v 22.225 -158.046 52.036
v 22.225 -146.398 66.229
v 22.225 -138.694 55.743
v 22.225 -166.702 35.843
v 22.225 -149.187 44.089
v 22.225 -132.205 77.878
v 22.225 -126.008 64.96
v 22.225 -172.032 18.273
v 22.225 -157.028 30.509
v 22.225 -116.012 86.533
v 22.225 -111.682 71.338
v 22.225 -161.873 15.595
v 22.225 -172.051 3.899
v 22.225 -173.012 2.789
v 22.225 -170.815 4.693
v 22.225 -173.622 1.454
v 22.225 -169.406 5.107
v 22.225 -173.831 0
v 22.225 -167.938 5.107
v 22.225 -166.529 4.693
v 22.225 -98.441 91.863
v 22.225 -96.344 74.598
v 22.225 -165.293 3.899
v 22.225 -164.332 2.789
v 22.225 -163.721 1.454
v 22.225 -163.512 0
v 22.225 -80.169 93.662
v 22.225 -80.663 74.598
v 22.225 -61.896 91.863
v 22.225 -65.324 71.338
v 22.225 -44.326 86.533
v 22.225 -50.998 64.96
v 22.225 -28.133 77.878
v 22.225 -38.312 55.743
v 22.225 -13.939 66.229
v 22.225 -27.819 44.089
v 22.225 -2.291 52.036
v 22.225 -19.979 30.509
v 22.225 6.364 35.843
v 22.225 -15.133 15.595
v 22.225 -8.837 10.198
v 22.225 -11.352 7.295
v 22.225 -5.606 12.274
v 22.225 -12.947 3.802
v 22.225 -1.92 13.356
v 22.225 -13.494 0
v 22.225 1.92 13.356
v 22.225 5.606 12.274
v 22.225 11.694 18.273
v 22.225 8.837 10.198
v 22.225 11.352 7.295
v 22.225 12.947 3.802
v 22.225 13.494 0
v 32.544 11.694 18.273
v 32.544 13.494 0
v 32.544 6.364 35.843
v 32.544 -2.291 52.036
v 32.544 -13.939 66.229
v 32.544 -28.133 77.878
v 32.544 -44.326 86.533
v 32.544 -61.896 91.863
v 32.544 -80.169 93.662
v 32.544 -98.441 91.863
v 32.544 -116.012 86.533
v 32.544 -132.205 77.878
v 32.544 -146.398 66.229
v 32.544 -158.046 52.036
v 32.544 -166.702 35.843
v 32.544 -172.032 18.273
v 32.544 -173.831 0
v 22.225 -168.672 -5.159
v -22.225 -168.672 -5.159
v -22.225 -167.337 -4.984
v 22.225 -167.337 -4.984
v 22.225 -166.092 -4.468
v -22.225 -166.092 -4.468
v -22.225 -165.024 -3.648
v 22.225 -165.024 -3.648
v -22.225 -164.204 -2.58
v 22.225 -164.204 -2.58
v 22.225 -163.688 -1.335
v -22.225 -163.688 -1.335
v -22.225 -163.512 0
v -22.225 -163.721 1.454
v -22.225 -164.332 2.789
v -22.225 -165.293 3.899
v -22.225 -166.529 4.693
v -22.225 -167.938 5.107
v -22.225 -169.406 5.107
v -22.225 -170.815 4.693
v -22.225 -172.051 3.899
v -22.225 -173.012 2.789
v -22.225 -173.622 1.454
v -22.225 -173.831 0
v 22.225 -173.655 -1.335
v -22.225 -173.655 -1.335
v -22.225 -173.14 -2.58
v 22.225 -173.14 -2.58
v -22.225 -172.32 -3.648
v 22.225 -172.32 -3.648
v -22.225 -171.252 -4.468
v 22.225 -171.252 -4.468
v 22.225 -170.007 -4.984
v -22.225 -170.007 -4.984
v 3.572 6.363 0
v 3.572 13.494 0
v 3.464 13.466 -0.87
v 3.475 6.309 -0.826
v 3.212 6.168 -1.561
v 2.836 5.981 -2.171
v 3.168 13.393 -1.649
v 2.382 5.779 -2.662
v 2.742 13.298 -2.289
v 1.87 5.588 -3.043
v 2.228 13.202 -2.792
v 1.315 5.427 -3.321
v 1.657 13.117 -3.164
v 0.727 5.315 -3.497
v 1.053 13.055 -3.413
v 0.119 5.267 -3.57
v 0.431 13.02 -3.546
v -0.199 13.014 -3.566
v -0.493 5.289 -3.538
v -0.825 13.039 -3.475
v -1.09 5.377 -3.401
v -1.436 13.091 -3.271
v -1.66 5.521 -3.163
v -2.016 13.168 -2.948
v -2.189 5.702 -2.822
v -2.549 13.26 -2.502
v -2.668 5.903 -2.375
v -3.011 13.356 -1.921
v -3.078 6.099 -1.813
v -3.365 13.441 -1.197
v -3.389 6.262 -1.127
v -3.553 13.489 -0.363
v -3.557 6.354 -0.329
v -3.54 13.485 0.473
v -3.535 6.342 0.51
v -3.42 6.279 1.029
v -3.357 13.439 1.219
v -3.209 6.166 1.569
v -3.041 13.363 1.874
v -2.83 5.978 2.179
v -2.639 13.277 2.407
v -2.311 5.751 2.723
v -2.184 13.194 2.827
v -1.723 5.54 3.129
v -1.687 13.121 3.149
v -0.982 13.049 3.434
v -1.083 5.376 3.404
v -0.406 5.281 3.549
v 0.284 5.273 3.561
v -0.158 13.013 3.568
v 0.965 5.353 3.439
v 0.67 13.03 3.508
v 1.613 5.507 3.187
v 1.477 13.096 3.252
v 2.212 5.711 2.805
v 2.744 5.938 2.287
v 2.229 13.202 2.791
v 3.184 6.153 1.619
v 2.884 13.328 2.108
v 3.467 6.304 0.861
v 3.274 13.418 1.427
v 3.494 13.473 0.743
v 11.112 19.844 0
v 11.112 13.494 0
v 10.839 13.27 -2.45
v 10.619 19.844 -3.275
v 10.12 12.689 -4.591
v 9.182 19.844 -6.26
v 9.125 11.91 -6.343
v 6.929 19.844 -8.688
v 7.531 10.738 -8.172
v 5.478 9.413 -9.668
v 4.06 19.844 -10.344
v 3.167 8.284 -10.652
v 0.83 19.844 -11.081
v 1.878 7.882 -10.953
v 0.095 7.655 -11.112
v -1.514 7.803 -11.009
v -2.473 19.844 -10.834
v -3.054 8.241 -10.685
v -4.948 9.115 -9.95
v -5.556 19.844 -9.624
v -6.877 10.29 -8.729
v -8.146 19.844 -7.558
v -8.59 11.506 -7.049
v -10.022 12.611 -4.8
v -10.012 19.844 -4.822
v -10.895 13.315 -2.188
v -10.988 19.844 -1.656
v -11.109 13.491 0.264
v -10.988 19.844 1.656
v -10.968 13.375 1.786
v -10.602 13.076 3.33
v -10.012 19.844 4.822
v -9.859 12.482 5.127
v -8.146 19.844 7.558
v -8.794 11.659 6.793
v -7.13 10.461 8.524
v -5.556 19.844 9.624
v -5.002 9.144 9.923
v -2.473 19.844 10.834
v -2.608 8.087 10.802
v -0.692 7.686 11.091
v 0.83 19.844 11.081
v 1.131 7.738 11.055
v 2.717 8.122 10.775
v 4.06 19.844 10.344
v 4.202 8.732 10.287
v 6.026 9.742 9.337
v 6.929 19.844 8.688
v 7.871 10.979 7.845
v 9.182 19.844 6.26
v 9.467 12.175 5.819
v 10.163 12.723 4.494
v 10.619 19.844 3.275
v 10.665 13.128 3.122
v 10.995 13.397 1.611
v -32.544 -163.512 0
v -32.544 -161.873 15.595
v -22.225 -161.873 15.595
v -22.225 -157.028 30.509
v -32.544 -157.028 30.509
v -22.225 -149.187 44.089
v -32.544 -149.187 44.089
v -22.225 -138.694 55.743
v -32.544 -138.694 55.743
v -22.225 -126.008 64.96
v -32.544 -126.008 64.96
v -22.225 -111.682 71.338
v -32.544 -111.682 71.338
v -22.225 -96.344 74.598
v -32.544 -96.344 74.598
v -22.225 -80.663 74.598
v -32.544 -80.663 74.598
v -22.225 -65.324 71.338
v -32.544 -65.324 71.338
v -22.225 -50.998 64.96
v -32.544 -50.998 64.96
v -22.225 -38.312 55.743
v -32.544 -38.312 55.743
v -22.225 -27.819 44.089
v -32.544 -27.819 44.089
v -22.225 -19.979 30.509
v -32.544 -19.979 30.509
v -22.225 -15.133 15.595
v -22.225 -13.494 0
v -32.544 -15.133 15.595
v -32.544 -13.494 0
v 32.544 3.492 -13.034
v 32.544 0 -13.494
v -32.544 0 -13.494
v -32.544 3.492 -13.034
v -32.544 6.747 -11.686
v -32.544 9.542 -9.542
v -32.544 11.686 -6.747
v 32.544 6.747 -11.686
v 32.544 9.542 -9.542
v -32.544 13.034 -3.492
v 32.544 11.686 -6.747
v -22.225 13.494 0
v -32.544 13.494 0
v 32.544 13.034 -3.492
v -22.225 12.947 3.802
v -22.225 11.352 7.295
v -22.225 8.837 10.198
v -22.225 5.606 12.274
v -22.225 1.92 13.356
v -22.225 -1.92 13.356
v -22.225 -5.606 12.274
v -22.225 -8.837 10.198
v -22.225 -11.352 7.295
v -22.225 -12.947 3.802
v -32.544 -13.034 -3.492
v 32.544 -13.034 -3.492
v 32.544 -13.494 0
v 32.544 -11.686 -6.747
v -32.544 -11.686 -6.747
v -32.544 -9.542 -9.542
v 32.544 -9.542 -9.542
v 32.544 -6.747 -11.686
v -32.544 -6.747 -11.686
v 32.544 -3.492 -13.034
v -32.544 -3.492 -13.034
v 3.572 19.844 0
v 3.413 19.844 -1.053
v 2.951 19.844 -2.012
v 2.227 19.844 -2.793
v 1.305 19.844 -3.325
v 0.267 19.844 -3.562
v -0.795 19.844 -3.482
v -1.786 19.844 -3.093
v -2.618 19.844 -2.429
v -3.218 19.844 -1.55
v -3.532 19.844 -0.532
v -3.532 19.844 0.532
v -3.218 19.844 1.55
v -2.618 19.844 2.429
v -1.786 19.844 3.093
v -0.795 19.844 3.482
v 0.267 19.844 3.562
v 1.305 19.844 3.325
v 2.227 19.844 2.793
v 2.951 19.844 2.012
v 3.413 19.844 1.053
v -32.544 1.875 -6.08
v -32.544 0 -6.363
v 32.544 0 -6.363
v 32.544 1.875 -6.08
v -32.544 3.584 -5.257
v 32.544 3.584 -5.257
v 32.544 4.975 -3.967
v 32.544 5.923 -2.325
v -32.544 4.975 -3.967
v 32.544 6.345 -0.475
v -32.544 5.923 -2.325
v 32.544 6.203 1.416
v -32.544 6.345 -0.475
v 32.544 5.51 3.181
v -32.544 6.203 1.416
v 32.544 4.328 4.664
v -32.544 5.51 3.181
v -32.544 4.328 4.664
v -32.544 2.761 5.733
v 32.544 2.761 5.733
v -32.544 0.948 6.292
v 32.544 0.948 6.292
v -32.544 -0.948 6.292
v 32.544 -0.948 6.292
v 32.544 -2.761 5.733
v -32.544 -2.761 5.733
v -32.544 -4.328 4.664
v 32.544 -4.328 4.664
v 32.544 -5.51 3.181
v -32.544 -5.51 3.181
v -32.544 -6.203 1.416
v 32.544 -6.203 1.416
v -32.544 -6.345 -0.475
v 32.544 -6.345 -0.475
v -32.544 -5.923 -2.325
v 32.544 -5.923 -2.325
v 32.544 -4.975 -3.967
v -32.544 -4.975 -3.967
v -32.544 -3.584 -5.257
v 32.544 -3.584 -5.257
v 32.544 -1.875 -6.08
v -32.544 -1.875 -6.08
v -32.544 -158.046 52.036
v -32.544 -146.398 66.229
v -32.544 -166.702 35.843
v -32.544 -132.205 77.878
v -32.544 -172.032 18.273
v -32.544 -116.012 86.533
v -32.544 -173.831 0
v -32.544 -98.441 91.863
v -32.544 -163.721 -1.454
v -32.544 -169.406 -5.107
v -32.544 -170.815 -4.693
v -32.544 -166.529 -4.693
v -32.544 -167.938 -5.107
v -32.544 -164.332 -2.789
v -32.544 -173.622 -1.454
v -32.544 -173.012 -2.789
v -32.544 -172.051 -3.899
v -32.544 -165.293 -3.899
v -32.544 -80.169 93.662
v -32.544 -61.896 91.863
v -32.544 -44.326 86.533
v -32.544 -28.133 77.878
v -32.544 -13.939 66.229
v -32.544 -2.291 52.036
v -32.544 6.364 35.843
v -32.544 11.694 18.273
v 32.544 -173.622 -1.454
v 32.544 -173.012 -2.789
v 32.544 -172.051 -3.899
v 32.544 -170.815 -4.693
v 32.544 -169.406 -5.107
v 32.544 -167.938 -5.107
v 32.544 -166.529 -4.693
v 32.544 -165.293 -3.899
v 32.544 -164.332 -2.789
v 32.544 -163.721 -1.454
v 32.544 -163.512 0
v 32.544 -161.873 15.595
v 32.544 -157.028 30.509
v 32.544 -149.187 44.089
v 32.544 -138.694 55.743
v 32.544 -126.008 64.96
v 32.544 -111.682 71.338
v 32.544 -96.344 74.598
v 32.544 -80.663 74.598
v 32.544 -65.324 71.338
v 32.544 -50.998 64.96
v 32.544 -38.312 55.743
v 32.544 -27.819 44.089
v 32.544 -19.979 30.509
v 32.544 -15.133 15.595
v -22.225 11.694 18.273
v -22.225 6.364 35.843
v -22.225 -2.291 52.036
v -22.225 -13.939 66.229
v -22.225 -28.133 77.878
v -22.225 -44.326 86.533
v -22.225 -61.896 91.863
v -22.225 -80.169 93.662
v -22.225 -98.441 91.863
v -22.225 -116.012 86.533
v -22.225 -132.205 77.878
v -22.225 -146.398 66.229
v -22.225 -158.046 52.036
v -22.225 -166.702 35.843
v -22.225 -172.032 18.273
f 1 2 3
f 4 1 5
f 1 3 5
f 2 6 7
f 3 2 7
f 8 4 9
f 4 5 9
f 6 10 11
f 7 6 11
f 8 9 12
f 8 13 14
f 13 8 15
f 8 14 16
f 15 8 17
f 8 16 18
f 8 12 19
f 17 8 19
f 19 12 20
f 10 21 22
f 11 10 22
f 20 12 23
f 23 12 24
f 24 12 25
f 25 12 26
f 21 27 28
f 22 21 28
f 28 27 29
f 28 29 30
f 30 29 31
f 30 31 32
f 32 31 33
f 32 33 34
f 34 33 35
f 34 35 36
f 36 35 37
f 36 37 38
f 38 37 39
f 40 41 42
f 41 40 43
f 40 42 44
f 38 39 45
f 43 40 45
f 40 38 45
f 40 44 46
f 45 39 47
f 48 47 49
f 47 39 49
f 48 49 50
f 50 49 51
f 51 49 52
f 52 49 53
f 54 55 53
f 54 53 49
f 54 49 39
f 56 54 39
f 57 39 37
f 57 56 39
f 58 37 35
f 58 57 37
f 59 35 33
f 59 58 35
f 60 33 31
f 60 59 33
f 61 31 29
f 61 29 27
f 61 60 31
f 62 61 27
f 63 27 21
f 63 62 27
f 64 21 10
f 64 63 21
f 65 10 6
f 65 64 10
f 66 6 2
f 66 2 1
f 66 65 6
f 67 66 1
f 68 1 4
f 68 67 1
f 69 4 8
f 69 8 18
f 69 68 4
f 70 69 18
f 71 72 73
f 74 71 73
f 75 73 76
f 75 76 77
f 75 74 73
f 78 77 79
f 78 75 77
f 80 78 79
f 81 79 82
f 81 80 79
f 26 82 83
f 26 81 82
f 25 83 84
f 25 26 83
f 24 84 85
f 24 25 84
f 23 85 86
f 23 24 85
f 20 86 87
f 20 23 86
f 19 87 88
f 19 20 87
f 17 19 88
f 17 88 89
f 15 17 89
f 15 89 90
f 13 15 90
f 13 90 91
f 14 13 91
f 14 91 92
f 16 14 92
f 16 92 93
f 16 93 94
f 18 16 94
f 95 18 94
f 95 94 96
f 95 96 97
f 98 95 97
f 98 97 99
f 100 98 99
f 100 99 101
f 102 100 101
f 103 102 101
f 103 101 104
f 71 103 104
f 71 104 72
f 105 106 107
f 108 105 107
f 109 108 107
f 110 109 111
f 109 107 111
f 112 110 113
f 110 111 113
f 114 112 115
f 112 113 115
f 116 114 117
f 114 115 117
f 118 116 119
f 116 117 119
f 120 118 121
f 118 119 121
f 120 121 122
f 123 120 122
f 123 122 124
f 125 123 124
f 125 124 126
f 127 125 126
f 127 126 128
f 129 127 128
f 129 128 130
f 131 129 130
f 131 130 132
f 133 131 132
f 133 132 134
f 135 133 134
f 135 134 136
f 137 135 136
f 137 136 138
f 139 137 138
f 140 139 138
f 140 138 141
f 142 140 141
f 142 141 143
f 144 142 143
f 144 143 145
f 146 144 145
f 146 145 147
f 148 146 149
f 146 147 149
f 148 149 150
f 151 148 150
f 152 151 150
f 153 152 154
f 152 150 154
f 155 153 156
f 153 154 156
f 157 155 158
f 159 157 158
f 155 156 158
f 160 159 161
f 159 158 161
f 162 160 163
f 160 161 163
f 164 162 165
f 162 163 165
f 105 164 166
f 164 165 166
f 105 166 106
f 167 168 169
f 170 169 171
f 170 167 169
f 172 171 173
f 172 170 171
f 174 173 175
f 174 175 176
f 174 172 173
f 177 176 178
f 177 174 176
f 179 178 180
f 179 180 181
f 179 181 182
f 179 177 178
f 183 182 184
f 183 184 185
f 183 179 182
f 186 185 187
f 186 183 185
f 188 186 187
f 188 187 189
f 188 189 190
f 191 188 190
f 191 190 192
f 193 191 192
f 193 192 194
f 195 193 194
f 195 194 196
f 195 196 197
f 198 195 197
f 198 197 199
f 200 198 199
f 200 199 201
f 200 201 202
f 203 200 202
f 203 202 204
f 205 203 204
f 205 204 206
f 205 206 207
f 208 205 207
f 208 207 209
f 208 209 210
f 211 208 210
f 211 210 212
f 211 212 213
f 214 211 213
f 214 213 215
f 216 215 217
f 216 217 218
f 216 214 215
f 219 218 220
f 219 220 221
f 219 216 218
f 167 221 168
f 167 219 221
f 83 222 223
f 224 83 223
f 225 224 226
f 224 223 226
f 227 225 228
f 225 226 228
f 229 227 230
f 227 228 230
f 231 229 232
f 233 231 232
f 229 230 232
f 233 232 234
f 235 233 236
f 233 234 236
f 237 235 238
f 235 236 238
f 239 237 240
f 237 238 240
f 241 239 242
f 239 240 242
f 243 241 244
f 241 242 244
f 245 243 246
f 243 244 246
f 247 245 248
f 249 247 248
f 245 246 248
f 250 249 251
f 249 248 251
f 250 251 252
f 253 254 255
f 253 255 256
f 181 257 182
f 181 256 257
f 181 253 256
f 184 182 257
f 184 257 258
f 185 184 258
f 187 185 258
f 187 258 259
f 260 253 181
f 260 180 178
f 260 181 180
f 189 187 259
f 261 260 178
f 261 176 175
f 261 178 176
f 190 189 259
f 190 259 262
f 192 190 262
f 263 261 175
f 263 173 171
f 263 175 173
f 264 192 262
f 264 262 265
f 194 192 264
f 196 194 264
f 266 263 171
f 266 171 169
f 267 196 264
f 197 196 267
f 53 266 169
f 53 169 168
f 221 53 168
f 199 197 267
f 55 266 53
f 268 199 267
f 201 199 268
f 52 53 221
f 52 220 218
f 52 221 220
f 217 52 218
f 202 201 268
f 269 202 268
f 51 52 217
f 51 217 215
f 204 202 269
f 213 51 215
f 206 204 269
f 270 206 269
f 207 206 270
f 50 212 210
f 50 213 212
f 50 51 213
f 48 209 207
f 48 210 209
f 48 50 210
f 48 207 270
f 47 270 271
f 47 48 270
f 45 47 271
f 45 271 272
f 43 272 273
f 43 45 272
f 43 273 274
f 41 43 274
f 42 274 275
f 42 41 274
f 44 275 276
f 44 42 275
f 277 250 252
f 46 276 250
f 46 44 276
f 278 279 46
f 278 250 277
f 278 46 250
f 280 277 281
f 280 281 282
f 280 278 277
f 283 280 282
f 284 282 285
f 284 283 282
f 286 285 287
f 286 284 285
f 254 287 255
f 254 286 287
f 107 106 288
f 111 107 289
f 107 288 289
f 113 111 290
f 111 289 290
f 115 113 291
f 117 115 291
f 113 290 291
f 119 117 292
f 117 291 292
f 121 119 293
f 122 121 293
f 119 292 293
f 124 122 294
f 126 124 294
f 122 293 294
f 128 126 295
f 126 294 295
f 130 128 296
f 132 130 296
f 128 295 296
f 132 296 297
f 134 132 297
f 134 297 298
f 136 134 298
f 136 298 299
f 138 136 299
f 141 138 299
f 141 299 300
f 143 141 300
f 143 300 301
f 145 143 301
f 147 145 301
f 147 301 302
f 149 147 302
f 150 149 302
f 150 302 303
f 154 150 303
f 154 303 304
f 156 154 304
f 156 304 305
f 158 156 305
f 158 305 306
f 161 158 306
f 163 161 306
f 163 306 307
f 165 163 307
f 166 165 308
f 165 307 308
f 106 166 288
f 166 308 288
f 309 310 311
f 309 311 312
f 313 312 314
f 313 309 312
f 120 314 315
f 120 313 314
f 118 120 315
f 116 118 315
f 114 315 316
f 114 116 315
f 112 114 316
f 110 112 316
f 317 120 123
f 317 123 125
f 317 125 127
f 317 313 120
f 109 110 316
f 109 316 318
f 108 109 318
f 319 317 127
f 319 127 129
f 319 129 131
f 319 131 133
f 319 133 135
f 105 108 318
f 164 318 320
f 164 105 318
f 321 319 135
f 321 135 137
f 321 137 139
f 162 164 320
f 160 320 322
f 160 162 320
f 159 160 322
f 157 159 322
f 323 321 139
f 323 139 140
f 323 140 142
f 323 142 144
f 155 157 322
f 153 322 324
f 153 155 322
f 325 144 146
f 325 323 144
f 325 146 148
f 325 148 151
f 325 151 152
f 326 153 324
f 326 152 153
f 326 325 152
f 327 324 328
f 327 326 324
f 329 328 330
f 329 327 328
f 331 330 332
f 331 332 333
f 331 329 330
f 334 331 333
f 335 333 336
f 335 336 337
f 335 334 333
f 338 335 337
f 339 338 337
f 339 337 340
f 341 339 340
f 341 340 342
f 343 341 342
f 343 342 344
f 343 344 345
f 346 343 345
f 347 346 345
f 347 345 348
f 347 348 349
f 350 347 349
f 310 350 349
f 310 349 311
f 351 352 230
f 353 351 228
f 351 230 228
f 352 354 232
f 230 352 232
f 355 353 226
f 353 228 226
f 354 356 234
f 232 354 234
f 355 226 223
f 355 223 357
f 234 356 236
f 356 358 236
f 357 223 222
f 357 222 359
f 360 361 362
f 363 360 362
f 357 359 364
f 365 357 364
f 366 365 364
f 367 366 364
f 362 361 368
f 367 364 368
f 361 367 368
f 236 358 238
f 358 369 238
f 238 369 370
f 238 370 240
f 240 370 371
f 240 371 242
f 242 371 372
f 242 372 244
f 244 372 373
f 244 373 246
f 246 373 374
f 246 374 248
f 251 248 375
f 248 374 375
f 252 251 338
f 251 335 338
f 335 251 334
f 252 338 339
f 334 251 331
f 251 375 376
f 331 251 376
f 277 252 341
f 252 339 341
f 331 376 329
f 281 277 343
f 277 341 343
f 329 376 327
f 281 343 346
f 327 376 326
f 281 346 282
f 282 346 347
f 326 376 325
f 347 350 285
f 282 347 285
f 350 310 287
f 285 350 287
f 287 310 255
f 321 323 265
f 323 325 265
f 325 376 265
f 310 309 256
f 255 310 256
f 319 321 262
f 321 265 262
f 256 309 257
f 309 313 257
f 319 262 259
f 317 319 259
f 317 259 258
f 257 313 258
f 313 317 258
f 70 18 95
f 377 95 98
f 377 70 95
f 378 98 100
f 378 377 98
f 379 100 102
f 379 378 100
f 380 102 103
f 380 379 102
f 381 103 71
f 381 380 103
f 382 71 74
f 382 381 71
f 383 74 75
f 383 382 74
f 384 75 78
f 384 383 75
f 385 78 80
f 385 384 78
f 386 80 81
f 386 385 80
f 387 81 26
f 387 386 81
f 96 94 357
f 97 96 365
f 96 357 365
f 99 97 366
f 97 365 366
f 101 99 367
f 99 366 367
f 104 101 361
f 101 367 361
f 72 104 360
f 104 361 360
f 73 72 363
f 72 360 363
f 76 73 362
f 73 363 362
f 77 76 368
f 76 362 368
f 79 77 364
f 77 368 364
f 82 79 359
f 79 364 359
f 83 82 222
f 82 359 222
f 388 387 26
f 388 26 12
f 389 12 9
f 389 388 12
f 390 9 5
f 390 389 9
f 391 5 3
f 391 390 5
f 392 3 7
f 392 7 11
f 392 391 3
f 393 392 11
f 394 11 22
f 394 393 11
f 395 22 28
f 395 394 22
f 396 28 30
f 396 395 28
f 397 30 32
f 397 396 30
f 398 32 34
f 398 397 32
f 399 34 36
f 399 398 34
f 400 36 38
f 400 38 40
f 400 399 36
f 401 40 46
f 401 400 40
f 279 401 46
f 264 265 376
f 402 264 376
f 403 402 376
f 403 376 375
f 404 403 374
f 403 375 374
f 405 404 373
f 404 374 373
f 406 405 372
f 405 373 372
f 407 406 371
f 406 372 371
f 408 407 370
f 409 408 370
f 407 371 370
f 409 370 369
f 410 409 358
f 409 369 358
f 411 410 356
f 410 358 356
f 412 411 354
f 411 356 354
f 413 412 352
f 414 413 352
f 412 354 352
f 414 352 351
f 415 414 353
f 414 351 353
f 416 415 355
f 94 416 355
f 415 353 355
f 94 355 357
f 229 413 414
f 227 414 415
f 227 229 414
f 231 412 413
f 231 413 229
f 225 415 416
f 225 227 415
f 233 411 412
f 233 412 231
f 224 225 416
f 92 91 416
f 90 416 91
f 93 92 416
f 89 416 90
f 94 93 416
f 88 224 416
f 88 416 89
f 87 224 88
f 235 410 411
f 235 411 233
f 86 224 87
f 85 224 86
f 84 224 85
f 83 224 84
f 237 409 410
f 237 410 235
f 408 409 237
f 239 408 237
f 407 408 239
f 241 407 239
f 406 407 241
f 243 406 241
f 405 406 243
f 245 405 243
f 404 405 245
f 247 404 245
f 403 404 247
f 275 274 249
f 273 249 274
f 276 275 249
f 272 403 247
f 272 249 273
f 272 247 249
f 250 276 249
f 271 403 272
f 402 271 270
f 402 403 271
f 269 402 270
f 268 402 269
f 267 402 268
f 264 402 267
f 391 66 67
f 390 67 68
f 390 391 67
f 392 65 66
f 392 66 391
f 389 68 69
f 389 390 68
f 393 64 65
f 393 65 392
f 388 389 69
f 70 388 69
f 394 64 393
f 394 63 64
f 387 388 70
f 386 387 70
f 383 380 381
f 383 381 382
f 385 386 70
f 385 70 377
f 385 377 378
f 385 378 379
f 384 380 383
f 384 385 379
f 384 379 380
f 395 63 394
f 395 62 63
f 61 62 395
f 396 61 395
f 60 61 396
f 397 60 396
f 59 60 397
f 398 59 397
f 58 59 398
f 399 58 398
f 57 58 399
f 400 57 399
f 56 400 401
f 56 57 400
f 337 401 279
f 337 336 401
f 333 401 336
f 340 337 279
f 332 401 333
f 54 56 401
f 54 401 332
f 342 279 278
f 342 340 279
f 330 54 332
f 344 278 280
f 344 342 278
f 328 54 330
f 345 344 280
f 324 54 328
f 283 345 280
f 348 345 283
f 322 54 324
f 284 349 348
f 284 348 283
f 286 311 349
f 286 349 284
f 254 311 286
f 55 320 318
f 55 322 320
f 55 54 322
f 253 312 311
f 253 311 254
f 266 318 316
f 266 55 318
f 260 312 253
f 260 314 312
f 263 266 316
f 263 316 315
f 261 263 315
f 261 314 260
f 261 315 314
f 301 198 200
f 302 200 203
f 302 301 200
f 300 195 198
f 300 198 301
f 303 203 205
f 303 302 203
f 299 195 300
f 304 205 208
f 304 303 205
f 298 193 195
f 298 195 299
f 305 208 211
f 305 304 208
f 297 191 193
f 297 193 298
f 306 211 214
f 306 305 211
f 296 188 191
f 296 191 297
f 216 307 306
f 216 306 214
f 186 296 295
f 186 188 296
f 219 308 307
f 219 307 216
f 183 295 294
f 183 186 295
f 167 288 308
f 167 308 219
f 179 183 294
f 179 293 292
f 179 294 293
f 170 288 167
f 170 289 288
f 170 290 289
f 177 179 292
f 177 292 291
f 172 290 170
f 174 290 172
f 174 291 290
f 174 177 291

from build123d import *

# Parameters (mm, degrees)
SKETCH2_R           = 13.49375
SKETCH2_R_2         = 6.3627
BOSS_EXTRUDE1_DEPTH = 32.54375
BOSS_EXTRUDE2_REACH = 35.337
SKETCH3_R           = 11.1125
SKETCH3_R_2         = 3.571875
CUT_EXTRUDE1_REACH  = 35.338
SKETCH3_2_R         = 3.571875
SKETCH4_R           = 13.49375
SKETCH4_R_2         = 6.3627
SKETCH4_R_3         = 5.159375
BOSS_EXTRUDE3_DEPTH = 10.31875
BOSS_EXTRUDE4_REACH = 67.088
SKETCH4_3_R         = 5.159375


with BuildPart() as part:
    # Sketch2 → Boss-Extrude1 (new body, symmetric)
    with BuildSketch(Plane(origin=(0, 0, 0), x_dir=(0, 0, -1), z_dir=(1, 0, 0))):
        Circle(SKETCH2_R)
        Circle(SKETCH2_R_2, mode=Mode.SUBTRACT)
    extrude(amount=BOSS_EXTRUDE1_DEPTH, both=True)

    # Sketch3 → Boss-Extrude2 (add, up to next)
    with BuildSketch(Plane(origin=(0, 19.84375, 0), x_dir=(1, 0, 0), z_dir=(0, 1, 0)), mode=Mode.PRIVATE) as boss_extrude2_sk1:
        Circle(SKETCH3_R)
        Circle(SKETCH3_R_2, mode=Mode.SUBTRACT)
    boss_extrude2_tool1 = extrude(boss_extrude2_sk1.sketch, amount=-BOSS_EXTRUDE2_REACH, mode=Mode.PRIVATE) - part.part
    add(boss_extrude2_tool1.solids().sort_by_distance((-10.798191, 19.84375, 0))[0])

    # Sketch3<2> → Cut-Extrude1 (cut, up to next)
    with BuildSketch(Plane(origin=(0, 19.84375, 0), x_dir=(1, 0, 0), z_dir=(0, 1, 0)), mode=Mode.PRIVATE) as cut_extrude1_sk1:
        Circle(SKETCH3_2_R)
    cut_extrude1_tool1 = extrude(cut_extrude1_sk1.sketch, amount=-CUT_EXTRUDE1_REACH, mode=Mode.PRIVATE) & part.part
    add(cut_extrude1_tool1.solids().sort_by_distance((0, 19.84375, 0))[0], mode=Mode.SUBTRACT)

    # Sketch4 → Boss-Extrude3 (add)
    with BuildSketch(Plane(origin=(32.54375, 0, 0), x_dir=(0, 0, -1), z_dir=(1, 0, 0))):
        with BuildLine():
            ThreePointArc((0, -13.49375), (-13.49375, 0), (0, 13.49375))
            ThreePointArc((0, 13.49375), (-93.6625, -80.16875), (0, -173.83125))
            ThreePointArc((0, -173.83125), (-5.159375, -168.671875), (0, -163.5125))
            ThreePointArc((0, -163.5125), (-75.009375, -88.503125), (0, -13.49375))
        make_face()
        Circle(SKETCH4_R)
        Circle(SKETCH4_R_2, mode=Mode.SUBTRACT)
        with Locations((0, -168.671875)):
            Circle(SKETCH4_R_3)
    boss_extrude3 = extrude(amount=-BOSS_EXTRUDE3_DEPTH)

    # Mirror1: Boss-Extrude3 across plane
    add(boss_extrude3.mirror(Plane(origin=(0, 0, 0), x_dir=(0, 0, 1), z_dir=(1, 0, 0))))

    # Sketch4<3> → Boss-Extrude4 (add, up to next)
    with BuildSketch(Plane(origin=(32.54375, 0, 0), x_dir=(0, 0, -1), z_dir=(1, 0, 0)), mode=Mode.PRIVATE) as boss_extrude4_sk1:
        with Locations((0, -168.671875)):
            Circle(SKETCH4_3_R)
    boss_extrude4_tool1 = extrude(boss_extrude4_sk1.sketch, amount=-BOSS_EXTRUDE4_REACH, mode=Mode.PRIVATE) - part.part
    add(boss_extrude4_tool1.solids().sort_by_distance((32.54375, -168.671875, 0))[0])


solid = part.part
